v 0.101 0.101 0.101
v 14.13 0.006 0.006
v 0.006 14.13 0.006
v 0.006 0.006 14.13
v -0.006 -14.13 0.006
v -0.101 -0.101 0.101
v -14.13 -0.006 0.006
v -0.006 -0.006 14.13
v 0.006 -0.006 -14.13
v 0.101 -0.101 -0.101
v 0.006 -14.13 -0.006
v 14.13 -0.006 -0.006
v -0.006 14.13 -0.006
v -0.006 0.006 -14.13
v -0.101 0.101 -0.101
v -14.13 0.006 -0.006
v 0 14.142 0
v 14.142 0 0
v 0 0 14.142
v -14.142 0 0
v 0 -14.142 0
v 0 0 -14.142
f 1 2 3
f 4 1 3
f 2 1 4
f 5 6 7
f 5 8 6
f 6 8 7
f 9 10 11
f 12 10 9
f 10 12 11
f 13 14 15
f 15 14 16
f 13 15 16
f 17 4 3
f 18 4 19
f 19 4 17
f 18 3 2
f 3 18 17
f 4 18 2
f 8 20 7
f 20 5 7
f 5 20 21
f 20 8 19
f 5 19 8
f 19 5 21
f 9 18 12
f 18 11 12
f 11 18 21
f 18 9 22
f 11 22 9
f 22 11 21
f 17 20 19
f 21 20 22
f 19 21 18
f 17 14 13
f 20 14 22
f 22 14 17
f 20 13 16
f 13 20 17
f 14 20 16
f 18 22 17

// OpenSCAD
// source:  http://dmccooey.com/polyhedra/Octahedron.html
// generated by  http://kitwallace.co.uk/3d/solid.xq
Name = "Octahedron";
C0 = 0.7071067811865475244008443621048;
points = [
[0.0, 0.0,  C0],
[0.0, 0.0, -C0],
[ C0, 0.0, 0.0],
[-C0, 0.0, 0.0],
[0.0,  C0, 0.0],
[0.0, -C0, 0.0]];
faces = [
[ 4 , 2, 0],
[ 3 , 4, 0],
[ 5 , 3, 0],
[ 2 , 5, 0],
[ 5 , 2, 1],
[ 3 , 5, 1],
[ 4 , 3, 1],
[ 2 , 4, 1]];
edges = [
[2,4],
[0,2],
[0,4],
[3,4],
[0,3],
[3,5],
[0,5],
[2,5],
[1,2],
[1,5],
[1,3],
[1,4]];
// --------------------------------- 

module locate(p1, p2) {
   assign(p = p2 - p1)
   assign(distance = norm(p)) {   
      translate(p1)
//rotation of XoY plane by the Z axis with the angle of the [p1 p2] line projection with the X axis on the XoY plane
      rotate([0, 0, atan2(p[1], p[0])]) //rotation
//rotation of ZoX plane by the y axis with the angle given by the z coordinate and the sqrt(x^2 + y^2)) point in the XoY plan
      rotate([0, atan2(sqrt(pow(p[0], 2)+pow(p[1], 2)),p[2]), 0])
      children();
  }
}

function m_translate(v) = [ [1, 0, 0, 0],
                            [0, 1, 0, 0],
                            [0, 0, 1, 0],
                            [v.x, v.y, v.z, 1  ] ];
                            
function m_rotate(v) =  [ [1,  0,         0,        0],
                          [0,  cos(v.x),  sin(v.x), 0],
                          [0, -sin(v.x),  cos(v.x), 0],
                          [0,  0,         0,        1] ]
                      * [ [ cos(v.y), 0,  -sin(v.y), 0],
                          [0,         1,  0,        0],
                          [ sin(v.y), 0,  cos(v.y), 0],
                          [0,         0,  0,        1] ]
                      * [ [ cos(v.z),  sin(v.z), 0, 0],
                          [-sin(v.z),  cos(v.z), 0, 0],
                          [ 0,         0,        1, 0],
                          [ 0,         0,        0, 1] ];
                            
function vec3(v) = [v.x, v.y, v.z];
function transform(v, m)  = vec3([v.x, v.y, v.z, 1] * m);
                            
function orientate(p0, p) = 
                       m_rotate([0, atan2(sqrt(pow(p[0], 2) + pow(p[1], 2)), p[2]), 0]) 
                     * m_rotate([0, 0, atan2(p[1], p[0])]) 
                     * m_translate(p0 + p);

function orientate_r(p0, p) = 
                      m_translate(-(p0 + p))
                      * m_rotate([0, 0, -atan2(p[1], p[0])]) 
                      * m_rotate([0, -atan2(sqrt(pow(p[0], 2) + pow(p[1], 2)), p[2]), 0]); 

function transform_points(list, matrix, i = 0) = 
    i < len(list) 
       ? concat([ transform(list[i], matrix) ], transform_points(list, matrix, i + 1))
       : [];

function as_points(ids,points,i=0) =
     i < len(ids) 
        ?  concat([points[ids[i]]], as_points(ids,points,i+1))
        : [];

function normal_r(face) =
     cross(face[1]-face[0],face[2]-face[0]);

function normal(face) =
     - normal_r(face) / norm(normal_r(face));

function centre(points) = 
      vsum(points) / len(points);

function vsum(points,i=0) =
      i < len(points)
        ?  (points[i] + vsum(points,i+1))
        :  [0,0,0];


function vsub(points,v,i=0) =
      i < len(points)
        ?  concat([points[i] - v], vsub(points,v,i+1))
        :  [];

function project(pts,i=0) =
     i < len(pts)
        ? concat([[pts[i][0],pts[i][1]]], project(pts,i+1))
        : [];


module face_prism (face,face_scale,prism_scale,h) {
    assign (n = normal(face), c= centre(face))
    assign (m = orientate_r(c,n))
    assign (tpts =  face_scale * transform_points(face,m))
    assign (xy = project(tpts))
      linear_extrude(height=h,scale=prism_scale) 
          polygon(points=xy);
}

module face_prisms_in(faces,points,face_scale,prism_scale,h) {
    for (i=[0:len(faces) - 1]) 
       assign (f = as_points(faces[i],points)) 
       assign (n = normal(f), c = centre(f))
       locate(c,c+n) 
          translate([0,0,eps]) 
               mirror() rotate([0,180,0]) 
                   face_prism(f,face_scale,prism_scale,h);
}

module face_prisms_out(faces,points,face_scale,prism_scale,h) {
    for (i=[0:len(faces) - 1]) 
       assign (f = as_points(faces[i],points)) 
       assign (n = normal(f), c = centre(f))
       locate(c,c+n) 
          face_prism(f,face_scale,prism_scale,h);
}


eps=0.01;
scale=20;
shell_ratio=1;
prism_ratio =1;
prism_height=8;
prism_scale=0;
spoints = scale * points;

sfaces = [
[ 4 , 2, 0],
[ 5 , 3, 0],
[ 5 , 2, 1],
[ 4 , 3, 1]
];

difference() {
    polyhedron(spoints,faces);
    scale(1-shell_ratio) polyhedron(spoints,faces);
    face_prisms_in(sfaces,spoints,prism_ratio,prism_scale,prism_height);
}
